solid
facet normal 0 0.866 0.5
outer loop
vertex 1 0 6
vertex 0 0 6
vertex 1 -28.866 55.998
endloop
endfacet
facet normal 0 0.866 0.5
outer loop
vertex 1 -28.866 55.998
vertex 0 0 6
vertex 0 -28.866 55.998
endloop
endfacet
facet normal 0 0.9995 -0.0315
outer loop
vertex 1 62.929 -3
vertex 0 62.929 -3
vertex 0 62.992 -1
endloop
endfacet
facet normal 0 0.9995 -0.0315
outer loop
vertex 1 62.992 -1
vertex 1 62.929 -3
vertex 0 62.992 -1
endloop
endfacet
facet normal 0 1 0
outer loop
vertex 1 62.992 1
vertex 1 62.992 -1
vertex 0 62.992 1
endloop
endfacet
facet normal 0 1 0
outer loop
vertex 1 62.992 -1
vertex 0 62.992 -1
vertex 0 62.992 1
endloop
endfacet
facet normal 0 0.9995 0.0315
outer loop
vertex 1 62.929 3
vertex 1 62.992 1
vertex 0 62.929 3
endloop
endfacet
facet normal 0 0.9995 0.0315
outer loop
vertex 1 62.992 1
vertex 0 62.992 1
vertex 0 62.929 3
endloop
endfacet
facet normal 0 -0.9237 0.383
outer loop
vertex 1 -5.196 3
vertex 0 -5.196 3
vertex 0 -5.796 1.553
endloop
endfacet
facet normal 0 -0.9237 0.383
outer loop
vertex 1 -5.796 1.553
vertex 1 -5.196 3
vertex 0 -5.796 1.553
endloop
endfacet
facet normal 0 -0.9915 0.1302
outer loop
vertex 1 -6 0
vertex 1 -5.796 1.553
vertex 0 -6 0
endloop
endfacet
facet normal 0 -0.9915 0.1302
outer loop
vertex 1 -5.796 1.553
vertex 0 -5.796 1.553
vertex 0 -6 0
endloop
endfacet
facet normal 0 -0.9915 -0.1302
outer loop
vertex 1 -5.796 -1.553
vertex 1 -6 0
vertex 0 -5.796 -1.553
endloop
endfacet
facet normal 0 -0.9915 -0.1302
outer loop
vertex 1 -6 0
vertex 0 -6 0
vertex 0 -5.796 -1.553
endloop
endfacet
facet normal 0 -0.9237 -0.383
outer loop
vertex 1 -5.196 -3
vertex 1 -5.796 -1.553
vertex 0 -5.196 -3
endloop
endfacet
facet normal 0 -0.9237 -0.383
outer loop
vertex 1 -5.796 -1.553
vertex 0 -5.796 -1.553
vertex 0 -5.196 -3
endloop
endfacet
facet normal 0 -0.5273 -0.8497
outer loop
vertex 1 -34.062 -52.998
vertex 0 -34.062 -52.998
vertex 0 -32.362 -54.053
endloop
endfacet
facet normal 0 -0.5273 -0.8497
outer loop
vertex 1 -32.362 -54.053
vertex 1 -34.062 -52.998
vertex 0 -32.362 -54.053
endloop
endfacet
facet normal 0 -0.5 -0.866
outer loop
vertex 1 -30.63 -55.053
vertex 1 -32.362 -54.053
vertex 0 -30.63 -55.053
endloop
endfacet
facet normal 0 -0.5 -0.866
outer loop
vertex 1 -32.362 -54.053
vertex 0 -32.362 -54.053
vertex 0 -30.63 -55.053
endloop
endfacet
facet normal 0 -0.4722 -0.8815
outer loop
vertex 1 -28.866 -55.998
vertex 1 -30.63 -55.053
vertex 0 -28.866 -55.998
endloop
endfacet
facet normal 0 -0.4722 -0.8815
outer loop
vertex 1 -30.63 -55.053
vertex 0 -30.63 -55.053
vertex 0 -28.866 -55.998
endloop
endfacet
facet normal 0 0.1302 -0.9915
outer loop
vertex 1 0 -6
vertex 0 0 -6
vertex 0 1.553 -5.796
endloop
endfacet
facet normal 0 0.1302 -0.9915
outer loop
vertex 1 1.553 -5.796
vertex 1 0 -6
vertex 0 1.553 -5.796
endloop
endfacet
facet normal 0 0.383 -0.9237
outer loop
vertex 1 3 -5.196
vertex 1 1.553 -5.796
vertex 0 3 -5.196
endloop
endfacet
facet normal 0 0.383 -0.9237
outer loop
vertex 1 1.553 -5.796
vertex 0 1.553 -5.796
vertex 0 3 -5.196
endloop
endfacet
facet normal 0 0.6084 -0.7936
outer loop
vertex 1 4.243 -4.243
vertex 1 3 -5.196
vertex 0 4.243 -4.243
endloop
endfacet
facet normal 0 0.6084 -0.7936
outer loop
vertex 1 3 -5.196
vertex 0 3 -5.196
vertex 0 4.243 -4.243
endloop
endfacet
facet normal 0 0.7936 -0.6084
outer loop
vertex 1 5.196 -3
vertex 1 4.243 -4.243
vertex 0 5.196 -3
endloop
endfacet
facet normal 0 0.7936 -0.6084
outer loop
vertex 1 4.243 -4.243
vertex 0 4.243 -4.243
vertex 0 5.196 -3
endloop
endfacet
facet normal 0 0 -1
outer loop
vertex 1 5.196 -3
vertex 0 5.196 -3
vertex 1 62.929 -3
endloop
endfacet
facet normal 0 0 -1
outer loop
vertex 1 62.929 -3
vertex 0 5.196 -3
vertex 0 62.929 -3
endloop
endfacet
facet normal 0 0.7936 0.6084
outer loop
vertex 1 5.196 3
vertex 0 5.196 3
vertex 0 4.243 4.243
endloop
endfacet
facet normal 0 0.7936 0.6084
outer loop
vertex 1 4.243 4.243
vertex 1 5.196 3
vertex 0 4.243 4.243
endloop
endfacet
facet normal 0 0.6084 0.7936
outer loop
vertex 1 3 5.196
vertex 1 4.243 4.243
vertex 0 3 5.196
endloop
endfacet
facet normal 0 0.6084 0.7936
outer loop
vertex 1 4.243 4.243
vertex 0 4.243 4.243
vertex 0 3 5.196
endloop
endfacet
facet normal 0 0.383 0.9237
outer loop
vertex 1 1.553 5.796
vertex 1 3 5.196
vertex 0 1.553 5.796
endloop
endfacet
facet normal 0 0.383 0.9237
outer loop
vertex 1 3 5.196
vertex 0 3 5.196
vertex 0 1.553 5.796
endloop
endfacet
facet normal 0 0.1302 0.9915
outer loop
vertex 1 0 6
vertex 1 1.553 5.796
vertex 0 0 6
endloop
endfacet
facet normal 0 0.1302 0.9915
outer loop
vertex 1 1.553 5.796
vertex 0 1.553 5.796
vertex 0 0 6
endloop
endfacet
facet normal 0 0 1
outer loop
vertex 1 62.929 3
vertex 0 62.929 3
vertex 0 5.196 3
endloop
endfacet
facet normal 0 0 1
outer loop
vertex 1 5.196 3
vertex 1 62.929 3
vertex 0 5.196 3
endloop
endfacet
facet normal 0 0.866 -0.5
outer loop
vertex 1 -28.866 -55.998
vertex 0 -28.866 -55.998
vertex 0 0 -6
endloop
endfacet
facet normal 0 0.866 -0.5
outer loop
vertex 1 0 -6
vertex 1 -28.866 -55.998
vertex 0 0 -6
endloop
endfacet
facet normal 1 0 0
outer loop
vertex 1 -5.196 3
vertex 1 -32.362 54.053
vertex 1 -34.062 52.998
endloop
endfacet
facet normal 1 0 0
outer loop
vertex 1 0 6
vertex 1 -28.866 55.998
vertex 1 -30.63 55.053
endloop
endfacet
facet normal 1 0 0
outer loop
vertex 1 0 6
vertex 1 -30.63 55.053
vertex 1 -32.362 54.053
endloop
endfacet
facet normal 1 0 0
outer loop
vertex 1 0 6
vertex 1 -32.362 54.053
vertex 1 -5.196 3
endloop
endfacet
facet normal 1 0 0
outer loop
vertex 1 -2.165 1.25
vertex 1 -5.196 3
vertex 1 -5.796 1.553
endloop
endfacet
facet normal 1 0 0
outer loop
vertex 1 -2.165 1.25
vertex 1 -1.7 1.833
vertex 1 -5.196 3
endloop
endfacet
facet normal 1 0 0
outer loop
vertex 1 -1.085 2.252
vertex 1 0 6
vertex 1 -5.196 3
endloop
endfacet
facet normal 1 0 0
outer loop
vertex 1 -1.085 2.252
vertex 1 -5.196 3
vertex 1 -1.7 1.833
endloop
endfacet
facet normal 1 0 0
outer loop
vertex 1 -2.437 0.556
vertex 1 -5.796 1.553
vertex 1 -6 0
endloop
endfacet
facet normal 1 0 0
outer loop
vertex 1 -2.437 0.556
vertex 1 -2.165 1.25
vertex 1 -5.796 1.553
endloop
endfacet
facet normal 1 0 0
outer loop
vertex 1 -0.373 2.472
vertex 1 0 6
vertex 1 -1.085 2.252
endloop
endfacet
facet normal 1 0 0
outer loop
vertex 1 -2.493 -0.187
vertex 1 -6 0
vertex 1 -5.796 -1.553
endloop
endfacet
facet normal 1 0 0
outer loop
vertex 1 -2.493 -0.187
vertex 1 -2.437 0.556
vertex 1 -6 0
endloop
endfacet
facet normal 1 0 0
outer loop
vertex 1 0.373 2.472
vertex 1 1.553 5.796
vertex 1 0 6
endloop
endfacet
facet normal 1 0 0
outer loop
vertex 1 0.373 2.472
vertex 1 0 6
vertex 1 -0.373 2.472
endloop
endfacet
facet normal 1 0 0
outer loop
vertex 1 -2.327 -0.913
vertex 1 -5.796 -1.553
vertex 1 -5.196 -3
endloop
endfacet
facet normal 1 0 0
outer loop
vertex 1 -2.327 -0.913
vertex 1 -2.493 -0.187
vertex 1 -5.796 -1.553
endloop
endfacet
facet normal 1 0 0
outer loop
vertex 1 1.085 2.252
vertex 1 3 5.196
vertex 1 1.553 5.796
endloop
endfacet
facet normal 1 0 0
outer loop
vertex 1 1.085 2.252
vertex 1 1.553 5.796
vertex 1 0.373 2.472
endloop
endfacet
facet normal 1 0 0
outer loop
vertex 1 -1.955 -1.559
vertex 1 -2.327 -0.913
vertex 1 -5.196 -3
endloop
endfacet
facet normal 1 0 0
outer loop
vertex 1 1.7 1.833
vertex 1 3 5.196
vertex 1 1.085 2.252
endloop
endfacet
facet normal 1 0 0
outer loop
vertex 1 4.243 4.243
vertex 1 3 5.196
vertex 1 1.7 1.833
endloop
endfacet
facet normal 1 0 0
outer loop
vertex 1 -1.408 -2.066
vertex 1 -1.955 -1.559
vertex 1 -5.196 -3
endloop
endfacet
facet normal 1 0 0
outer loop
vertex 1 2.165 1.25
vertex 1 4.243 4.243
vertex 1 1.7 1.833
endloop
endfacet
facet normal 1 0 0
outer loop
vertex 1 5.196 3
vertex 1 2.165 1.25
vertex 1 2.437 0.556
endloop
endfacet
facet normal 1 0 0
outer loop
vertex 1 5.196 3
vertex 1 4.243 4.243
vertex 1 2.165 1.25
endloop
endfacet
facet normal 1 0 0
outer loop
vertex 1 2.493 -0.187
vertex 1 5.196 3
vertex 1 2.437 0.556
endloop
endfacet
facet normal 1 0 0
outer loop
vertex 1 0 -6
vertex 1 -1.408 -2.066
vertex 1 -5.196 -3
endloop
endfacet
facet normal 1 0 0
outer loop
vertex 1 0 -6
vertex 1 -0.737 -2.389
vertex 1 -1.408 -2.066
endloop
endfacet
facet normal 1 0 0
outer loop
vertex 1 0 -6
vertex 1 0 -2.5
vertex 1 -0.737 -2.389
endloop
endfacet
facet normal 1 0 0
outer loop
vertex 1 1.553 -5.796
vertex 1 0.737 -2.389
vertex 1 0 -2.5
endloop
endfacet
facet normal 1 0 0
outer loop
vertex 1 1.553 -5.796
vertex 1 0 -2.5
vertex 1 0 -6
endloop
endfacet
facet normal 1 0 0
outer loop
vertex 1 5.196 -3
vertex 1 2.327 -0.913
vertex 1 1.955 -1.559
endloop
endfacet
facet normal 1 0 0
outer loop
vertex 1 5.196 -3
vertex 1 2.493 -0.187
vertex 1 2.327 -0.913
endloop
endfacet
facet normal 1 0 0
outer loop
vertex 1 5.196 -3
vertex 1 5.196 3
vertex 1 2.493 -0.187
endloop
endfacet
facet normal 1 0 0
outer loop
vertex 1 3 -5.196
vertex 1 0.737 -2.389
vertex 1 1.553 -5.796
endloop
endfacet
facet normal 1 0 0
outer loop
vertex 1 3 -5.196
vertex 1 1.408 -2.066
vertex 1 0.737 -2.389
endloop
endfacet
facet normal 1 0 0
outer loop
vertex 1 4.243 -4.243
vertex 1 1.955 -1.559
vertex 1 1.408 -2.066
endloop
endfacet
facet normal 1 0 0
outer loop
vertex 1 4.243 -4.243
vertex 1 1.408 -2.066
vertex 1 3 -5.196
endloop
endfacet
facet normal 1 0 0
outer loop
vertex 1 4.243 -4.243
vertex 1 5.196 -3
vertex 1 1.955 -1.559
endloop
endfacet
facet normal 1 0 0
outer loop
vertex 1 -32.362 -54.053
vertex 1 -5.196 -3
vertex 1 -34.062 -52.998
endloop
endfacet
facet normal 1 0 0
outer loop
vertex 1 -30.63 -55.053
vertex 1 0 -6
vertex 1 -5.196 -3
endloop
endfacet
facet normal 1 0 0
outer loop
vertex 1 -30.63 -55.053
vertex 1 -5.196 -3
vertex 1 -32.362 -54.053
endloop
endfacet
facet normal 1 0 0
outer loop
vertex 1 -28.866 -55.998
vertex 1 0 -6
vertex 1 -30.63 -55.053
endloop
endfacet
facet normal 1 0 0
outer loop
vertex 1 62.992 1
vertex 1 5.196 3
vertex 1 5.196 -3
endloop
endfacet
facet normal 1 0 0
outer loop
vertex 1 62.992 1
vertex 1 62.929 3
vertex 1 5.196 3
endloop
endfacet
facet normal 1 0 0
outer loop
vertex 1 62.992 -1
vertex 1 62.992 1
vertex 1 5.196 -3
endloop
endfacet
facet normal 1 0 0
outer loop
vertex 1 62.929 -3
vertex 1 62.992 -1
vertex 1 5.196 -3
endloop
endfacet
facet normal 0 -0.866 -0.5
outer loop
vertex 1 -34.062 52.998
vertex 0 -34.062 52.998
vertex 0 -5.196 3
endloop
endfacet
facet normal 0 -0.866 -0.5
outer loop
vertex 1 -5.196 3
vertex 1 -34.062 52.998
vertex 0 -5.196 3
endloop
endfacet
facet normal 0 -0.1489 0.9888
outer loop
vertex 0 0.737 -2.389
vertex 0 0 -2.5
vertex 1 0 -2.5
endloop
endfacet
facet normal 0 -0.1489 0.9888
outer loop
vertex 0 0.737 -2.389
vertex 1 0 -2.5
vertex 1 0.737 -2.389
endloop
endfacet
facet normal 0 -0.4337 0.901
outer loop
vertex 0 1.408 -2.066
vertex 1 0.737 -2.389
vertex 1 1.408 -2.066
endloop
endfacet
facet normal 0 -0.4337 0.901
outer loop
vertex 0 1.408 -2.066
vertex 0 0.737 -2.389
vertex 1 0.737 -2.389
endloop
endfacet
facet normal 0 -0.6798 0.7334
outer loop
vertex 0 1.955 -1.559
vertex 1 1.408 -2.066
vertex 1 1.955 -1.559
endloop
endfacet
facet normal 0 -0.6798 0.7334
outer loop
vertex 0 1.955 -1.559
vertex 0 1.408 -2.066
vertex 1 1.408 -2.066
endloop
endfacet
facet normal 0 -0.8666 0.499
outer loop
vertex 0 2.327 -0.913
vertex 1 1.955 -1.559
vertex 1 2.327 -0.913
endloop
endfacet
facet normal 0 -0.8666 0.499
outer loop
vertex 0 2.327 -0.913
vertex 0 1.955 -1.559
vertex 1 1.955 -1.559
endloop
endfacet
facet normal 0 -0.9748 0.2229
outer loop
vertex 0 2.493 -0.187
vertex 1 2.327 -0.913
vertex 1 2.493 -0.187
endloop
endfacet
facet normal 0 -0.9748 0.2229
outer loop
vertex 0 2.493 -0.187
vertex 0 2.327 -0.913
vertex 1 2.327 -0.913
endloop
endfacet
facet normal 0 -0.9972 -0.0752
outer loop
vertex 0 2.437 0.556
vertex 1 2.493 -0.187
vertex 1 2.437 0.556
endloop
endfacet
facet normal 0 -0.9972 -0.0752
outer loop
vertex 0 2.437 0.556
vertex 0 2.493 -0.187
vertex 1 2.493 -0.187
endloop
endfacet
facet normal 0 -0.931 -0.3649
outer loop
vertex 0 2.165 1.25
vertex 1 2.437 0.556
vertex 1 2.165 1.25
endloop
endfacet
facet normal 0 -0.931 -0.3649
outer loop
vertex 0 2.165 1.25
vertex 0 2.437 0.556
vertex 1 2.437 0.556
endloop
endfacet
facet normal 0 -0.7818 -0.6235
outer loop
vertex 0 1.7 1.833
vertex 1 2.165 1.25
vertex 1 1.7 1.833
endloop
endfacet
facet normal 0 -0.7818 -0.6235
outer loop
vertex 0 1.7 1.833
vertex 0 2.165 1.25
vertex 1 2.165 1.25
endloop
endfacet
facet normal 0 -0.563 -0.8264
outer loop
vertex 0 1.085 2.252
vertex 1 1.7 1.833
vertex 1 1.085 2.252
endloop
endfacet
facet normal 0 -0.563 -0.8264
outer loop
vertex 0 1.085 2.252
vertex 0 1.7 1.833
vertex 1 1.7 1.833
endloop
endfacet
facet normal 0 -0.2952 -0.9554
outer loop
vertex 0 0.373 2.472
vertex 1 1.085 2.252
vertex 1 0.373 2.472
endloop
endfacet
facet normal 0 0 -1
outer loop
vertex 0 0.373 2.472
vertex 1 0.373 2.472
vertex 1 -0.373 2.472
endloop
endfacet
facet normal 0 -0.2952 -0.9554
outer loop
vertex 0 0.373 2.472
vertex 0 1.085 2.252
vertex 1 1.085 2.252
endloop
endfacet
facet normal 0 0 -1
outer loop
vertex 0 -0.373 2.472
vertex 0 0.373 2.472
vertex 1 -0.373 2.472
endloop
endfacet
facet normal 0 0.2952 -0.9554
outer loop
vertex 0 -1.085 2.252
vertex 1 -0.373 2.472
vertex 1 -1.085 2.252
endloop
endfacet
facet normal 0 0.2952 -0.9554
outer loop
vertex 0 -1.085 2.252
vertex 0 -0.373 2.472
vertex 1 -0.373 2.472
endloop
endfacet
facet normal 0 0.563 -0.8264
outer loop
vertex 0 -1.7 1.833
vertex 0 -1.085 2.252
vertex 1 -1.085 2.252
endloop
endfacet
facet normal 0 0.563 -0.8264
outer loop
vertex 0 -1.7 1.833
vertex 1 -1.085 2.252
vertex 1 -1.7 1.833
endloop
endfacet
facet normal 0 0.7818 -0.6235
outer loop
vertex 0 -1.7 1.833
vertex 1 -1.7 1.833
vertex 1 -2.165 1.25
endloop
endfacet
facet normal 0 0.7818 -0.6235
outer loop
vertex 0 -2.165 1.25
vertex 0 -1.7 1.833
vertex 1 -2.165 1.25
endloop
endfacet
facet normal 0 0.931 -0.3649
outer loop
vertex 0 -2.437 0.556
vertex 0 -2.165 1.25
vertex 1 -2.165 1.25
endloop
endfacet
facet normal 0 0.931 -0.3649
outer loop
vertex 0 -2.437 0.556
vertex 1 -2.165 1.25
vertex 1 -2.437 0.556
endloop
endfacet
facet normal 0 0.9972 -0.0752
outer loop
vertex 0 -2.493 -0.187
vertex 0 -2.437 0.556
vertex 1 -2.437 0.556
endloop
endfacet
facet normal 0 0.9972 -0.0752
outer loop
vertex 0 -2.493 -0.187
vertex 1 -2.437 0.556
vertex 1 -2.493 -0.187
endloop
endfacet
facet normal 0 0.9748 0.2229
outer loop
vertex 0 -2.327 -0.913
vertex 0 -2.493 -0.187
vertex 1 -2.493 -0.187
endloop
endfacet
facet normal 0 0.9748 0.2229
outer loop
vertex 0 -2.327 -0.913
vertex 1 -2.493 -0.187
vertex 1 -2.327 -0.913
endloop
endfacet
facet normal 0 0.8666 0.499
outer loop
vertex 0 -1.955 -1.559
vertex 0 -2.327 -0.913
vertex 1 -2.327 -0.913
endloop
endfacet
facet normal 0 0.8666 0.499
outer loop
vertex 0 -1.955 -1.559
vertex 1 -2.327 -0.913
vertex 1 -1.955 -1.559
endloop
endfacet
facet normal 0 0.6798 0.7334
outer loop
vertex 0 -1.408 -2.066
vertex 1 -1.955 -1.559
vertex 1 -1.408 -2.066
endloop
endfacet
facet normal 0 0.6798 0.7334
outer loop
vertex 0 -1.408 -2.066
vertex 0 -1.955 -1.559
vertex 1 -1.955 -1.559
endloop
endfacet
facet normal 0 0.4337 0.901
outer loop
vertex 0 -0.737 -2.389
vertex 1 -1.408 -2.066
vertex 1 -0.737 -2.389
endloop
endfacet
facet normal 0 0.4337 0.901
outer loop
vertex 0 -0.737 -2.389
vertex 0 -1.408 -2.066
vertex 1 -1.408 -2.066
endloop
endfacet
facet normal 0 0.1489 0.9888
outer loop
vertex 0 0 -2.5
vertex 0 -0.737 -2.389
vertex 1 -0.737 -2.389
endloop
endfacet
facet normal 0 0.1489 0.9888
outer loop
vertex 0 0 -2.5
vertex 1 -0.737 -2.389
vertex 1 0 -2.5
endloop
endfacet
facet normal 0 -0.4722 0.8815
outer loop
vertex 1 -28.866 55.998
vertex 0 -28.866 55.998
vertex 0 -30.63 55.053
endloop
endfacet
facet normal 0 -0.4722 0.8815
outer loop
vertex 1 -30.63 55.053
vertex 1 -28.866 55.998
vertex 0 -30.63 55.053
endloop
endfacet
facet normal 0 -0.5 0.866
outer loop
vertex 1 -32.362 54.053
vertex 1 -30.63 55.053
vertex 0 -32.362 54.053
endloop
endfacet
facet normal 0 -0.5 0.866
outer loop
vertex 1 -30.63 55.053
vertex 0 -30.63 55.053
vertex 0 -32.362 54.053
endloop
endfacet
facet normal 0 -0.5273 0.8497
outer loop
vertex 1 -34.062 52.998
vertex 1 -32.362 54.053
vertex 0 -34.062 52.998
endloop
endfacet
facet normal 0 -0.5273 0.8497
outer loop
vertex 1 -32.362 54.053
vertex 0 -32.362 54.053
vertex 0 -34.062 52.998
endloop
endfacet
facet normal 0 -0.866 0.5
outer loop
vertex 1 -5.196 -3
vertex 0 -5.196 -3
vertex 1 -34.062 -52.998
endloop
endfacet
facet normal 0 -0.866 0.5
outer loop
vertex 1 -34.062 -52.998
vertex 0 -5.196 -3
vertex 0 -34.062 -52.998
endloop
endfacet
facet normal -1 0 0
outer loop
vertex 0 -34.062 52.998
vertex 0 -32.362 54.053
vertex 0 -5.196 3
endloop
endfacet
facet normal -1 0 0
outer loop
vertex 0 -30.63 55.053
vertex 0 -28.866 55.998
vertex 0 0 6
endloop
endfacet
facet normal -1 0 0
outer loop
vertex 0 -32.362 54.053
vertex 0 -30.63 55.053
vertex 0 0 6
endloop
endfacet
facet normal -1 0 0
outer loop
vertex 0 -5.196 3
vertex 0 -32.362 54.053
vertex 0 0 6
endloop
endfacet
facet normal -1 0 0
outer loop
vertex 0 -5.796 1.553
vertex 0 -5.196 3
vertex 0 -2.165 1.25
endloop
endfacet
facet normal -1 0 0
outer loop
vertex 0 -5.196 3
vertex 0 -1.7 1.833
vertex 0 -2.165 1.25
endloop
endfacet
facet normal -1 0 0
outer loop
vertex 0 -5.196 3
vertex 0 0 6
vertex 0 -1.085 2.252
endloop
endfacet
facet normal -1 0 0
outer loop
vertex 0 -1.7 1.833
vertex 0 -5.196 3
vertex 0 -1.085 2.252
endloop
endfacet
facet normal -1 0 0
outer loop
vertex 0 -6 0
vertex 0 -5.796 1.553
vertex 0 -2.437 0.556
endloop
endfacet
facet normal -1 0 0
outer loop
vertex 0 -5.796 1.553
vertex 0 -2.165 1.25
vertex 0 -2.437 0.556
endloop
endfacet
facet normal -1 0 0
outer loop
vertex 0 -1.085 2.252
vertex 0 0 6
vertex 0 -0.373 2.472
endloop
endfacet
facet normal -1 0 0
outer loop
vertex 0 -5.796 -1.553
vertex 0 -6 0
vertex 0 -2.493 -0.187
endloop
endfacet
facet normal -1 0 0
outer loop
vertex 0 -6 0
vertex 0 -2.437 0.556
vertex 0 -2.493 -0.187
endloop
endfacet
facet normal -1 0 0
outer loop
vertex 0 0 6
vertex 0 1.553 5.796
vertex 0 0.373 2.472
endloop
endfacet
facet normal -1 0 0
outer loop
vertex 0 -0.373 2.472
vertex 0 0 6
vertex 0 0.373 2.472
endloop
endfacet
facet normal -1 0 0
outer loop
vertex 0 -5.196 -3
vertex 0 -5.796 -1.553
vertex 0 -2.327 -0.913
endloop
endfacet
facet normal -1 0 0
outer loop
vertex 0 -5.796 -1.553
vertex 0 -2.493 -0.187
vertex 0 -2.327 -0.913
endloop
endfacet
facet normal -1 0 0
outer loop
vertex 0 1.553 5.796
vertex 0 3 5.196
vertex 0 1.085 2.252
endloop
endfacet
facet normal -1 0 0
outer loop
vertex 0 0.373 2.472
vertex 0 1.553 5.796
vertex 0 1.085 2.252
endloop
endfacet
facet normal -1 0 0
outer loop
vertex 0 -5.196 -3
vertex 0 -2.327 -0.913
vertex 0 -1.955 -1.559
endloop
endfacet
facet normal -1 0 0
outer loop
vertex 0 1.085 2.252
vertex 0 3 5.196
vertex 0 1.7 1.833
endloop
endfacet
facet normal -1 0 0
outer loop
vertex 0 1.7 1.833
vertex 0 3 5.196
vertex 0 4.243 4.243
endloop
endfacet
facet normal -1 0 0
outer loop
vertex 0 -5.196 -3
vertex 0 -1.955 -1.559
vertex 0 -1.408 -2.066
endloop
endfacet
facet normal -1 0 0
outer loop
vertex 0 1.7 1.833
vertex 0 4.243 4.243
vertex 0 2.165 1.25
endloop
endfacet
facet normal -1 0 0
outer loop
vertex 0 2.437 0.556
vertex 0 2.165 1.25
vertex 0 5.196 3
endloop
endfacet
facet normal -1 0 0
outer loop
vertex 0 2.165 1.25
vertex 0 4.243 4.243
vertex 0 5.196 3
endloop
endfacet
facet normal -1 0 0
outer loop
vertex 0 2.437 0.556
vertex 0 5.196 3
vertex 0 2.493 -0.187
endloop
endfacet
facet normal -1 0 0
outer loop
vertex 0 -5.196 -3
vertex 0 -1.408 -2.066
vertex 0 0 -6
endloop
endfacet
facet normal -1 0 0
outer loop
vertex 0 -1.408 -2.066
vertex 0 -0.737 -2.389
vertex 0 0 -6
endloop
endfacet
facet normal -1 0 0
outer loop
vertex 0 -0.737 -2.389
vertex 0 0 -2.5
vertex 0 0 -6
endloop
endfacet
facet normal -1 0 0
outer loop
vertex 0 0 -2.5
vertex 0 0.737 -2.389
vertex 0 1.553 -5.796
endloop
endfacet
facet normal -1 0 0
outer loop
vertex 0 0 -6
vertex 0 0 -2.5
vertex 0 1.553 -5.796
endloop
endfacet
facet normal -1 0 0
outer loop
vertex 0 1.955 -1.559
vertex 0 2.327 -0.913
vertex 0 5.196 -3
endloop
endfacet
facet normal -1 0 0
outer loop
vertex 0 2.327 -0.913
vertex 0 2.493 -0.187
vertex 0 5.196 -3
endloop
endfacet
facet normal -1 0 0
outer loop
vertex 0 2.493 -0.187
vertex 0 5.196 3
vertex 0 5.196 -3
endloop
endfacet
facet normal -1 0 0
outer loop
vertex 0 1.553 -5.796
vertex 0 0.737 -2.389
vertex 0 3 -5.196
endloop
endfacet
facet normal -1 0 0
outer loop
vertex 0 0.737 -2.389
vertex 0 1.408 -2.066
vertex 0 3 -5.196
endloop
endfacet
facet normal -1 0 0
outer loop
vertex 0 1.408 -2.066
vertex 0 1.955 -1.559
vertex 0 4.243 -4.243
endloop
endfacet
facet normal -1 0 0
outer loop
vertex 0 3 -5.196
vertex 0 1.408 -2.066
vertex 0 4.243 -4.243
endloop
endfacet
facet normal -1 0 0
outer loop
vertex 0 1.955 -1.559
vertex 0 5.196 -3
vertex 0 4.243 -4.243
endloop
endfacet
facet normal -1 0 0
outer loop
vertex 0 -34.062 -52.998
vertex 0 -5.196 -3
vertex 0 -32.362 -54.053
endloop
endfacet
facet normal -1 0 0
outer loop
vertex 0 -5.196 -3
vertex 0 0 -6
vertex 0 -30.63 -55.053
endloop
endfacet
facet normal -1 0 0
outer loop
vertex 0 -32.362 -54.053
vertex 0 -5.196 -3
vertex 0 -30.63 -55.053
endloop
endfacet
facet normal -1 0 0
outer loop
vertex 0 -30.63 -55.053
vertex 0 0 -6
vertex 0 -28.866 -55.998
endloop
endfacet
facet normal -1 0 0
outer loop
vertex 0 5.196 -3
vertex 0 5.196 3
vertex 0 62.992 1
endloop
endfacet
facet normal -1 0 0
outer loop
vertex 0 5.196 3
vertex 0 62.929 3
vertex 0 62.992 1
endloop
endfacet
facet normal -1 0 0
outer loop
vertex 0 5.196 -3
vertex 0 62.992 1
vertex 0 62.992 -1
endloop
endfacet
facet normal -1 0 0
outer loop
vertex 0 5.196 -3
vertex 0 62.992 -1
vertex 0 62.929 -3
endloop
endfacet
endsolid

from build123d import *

# Parameters (mm, degrees)
SKETCH_1_R               = 63
SKETCH_1_R_2             = 2.5
EXTRUDE_1_DEPTH          = 1
CUT_EXTRUDE_1_DEPTH      = 1
PATTERN_CIRCULAR_1_COUNT = 3


with BuildPart() as part:
    # 草图1 → 凸台-拉伸1 (new body)
    with BuildSketch(Plane(origin=(0, 0, 0), x_dir=(0, 0, -1), z_dir=(1, 0, 0))):
        Circle(SKETCH_1_R)
        Circle(SKETCH_1_R_2, mode=Mode.SUBTRACT)
    extrude(amount=EXTRUDE_1_DEPTH)

    # 草图2 → 切除-拉伸1 (cut)
    with BuildSketch(Plane.ZY):
        with BuildLine():
            Line((-3, 5.196152423), (-3, 62.92853089))
            ThreePointArc((-3, 62.92853089), (-54.559600438, 31.5), (-55.997706374, -28.866189234))
            Line((-55.997706374, -28.866189234), (-6, 0))
            ThreePointArc((-6, 0), (-5.196152423, 3), (-3, 5.196152423))
        make_face()
    cut_extrude_1 = extrude(amount=-CUT_EXTRUDE_1_DEPTH, mode=Mode.SUBTRACT)

    # 阵列(圆周)1: 切除-拉伸1 ×3 about axis
    pattern_circular_1_axis = Axis((1.05, 0, 0), (-1, 0, 0))
    for i in range(1, PATTERN_CIRCULAR_1_COUNT):
        add(cut_extrude_1.rotate(pattern_circular_1_axis, i * 360 / PATTERN_CIRCULAR_1_COUNT), mode=Mode.SUBTRACT)


solid = part.part
